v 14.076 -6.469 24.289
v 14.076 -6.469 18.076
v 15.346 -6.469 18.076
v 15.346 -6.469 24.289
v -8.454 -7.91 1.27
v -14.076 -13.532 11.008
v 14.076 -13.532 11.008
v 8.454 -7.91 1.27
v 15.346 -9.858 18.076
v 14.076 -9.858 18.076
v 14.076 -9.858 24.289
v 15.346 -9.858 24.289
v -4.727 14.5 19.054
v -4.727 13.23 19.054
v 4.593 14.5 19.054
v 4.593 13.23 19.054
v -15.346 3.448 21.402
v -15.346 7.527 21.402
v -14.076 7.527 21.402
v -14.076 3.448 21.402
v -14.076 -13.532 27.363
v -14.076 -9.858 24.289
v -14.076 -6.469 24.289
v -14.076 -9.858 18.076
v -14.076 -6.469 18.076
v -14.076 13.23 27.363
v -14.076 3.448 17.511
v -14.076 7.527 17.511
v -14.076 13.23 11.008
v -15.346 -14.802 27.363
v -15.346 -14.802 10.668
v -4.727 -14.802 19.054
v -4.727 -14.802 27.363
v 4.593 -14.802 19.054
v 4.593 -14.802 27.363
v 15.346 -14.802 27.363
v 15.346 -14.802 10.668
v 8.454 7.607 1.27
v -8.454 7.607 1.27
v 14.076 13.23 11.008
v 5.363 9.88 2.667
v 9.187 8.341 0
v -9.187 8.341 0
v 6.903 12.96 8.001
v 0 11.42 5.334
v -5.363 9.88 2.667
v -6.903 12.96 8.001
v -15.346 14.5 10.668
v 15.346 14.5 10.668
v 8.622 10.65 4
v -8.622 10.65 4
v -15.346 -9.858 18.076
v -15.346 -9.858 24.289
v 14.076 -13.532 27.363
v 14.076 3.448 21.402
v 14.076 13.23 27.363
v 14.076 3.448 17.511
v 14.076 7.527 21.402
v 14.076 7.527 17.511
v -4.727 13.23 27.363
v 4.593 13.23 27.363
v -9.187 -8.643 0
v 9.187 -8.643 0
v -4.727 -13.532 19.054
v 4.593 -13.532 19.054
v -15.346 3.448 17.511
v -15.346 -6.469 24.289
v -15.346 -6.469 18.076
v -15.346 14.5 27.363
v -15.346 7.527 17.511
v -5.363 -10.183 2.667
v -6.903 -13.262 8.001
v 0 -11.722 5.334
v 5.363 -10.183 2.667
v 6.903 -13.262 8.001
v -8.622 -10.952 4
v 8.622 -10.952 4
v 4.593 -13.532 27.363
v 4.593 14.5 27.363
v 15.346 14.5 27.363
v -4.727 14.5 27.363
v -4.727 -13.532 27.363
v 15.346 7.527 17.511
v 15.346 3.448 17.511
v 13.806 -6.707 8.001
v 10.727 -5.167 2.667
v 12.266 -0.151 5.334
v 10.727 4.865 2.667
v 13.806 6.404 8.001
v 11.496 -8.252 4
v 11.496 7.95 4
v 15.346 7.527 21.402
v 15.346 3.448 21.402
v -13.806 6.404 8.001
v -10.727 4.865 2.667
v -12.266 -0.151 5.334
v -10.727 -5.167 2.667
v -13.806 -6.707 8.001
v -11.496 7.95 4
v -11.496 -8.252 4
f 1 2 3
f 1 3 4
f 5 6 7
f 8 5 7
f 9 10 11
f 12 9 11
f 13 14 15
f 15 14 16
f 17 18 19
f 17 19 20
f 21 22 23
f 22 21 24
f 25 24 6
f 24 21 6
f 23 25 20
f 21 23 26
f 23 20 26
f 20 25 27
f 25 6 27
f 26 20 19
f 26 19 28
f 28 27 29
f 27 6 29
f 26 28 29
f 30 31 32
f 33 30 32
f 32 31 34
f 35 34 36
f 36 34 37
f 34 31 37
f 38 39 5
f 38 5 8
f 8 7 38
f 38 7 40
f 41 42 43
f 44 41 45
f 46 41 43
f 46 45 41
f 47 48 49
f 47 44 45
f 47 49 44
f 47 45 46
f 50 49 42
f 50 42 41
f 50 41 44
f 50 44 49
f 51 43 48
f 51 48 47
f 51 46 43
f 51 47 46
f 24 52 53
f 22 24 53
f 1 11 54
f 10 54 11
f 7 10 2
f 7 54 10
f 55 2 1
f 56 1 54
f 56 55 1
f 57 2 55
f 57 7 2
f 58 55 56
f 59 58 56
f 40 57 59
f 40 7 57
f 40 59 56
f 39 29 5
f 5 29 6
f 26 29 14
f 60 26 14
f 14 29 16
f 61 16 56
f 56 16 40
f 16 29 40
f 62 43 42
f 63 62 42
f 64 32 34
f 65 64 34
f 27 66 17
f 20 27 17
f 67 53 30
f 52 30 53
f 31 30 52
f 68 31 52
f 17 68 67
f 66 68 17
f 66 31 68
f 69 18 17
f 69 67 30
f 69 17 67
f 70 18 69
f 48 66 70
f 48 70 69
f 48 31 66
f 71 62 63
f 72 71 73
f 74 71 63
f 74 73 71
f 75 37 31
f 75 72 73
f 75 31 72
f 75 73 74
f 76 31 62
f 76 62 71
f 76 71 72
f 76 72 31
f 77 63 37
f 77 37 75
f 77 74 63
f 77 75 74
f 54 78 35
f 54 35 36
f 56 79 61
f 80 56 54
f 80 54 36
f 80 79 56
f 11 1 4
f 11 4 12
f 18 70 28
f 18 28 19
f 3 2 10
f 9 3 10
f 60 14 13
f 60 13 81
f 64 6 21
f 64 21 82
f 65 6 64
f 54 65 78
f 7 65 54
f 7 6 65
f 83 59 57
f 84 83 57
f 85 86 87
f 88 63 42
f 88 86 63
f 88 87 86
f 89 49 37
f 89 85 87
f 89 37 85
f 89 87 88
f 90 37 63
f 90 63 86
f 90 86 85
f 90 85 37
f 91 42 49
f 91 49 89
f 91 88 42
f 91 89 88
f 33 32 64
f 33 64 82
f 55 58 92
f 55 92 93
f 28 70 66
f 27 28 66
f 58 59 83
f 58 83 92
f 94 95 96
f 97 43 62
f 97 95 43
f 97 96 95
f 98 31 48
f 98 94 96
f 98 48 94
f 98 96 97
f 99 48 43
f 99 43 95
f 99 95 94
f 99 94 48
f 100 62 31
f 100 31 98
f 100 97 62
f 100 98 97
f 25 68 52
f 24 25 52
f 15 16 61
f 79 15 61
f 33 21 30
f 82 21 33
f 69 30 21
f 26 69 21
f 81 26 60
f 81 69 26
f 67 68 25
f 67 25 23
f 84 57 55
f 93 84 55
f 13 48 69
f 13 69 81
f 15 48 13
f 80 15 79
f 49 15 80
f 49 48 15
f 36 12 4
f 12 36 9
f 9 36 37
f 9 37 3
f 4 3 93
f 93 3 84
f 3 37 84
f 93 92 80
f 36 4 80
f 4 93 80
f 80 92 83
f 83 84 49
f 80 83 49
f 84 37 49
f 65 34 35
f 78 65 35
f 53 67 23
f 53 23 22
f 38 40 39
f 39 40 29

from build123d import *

# Parameters (mm, degrees)
F0_W      = 87.4929502606
F0_H      = 80.8734223247
F1_DEPTH  = 50.8
F1_TAPER  = -30
F3_W      = 88.9319777489
F3_H      = 89.219789952
F2_W      = 146.1517376103
F2_H      = 139.5322096743
F4_DEPTH  = 79.502
F6_SCALE  = 0.21
F7_T      = -1.27
F8_W      = 4.72650351
F8_H      = 8.3095808529
F8_W_2    = 4.5930747874
F9_DEPTH  = 29.3027641316
F10_W     = 3.3891107887
F10_H     = 6.2133707106
F10_W_2   = 4.0794850793
F10_H_2   = 3.8912016898
F11_DEPTH = 30.6928649982


with BuildPart() as f1:
    # F0 (on Top) → F1 (new body)
    with BuildSketch(Plane.XY):
        with Locations((0, -0.7195137441)):
            Rectangle(F0_W, F0_H)
    extrude(amount=F1_DEPTH, taper=F1_TAPER)

    # F3 (on face) + F2 (on face) → F4 (join)
    with BuildSketch(Plane.XY.offset(50.8)):
        with Locations((1.0073184967, -1.4390293509)):
            Rectangle(F3_W, F3_H)
    with BuildSketch(Plane.XY.offset(50.8)):
        with Locations((0, -0.7195137441)):
            Rectangle(F2_W, F2_H)
    extrude(amount=F4_DEPTH)


with BuildPart() as f1_1:
    # F6: moved
    add(f1.part.scale(F6_SCALE))

    # F7
    f7_openings = [f1_1.faces().sort_by_distance(p)[0] for p in [
        (0, -0.151098, 27.36342),
    ]]
    offset(amount=F7_T, openings=f7_openings)

    # F8 (on face) → F9 (cut, through all)
    with BuildSketch(Plane.XZ.offset(14.8019799021)):
        with Locations((-2.363251755, 23.2086295735)):
            Rectangle(F8_W, F8_H)
        with Locations((2.2965373937, 23.2086295735)):
            Rectangle(F8_W_2, F8_H)
    extrude(amount=-F9_DEPTH, mode=Mode.SUBTRACT)

    # F10 (on face) → F11 (cut, through all)
    with BuildSketch(Plane(origin=(-15.3459324491, 0, 0), x_dir=(0, -1, 0), z_dir=(-1, 0, 0))):
        with Locations((8.1630637869, 21.1822334677)):
            Rectangle(F10_W, F10_H)
        with Locations((-5.4875212954, 19.4562980905)):
            Rectangle(F10_W_2, F10_H_2)
    extrude(amount=-F11_DEPTH, mode=Mode.SUBTRACT)


solid = f1_1.part
